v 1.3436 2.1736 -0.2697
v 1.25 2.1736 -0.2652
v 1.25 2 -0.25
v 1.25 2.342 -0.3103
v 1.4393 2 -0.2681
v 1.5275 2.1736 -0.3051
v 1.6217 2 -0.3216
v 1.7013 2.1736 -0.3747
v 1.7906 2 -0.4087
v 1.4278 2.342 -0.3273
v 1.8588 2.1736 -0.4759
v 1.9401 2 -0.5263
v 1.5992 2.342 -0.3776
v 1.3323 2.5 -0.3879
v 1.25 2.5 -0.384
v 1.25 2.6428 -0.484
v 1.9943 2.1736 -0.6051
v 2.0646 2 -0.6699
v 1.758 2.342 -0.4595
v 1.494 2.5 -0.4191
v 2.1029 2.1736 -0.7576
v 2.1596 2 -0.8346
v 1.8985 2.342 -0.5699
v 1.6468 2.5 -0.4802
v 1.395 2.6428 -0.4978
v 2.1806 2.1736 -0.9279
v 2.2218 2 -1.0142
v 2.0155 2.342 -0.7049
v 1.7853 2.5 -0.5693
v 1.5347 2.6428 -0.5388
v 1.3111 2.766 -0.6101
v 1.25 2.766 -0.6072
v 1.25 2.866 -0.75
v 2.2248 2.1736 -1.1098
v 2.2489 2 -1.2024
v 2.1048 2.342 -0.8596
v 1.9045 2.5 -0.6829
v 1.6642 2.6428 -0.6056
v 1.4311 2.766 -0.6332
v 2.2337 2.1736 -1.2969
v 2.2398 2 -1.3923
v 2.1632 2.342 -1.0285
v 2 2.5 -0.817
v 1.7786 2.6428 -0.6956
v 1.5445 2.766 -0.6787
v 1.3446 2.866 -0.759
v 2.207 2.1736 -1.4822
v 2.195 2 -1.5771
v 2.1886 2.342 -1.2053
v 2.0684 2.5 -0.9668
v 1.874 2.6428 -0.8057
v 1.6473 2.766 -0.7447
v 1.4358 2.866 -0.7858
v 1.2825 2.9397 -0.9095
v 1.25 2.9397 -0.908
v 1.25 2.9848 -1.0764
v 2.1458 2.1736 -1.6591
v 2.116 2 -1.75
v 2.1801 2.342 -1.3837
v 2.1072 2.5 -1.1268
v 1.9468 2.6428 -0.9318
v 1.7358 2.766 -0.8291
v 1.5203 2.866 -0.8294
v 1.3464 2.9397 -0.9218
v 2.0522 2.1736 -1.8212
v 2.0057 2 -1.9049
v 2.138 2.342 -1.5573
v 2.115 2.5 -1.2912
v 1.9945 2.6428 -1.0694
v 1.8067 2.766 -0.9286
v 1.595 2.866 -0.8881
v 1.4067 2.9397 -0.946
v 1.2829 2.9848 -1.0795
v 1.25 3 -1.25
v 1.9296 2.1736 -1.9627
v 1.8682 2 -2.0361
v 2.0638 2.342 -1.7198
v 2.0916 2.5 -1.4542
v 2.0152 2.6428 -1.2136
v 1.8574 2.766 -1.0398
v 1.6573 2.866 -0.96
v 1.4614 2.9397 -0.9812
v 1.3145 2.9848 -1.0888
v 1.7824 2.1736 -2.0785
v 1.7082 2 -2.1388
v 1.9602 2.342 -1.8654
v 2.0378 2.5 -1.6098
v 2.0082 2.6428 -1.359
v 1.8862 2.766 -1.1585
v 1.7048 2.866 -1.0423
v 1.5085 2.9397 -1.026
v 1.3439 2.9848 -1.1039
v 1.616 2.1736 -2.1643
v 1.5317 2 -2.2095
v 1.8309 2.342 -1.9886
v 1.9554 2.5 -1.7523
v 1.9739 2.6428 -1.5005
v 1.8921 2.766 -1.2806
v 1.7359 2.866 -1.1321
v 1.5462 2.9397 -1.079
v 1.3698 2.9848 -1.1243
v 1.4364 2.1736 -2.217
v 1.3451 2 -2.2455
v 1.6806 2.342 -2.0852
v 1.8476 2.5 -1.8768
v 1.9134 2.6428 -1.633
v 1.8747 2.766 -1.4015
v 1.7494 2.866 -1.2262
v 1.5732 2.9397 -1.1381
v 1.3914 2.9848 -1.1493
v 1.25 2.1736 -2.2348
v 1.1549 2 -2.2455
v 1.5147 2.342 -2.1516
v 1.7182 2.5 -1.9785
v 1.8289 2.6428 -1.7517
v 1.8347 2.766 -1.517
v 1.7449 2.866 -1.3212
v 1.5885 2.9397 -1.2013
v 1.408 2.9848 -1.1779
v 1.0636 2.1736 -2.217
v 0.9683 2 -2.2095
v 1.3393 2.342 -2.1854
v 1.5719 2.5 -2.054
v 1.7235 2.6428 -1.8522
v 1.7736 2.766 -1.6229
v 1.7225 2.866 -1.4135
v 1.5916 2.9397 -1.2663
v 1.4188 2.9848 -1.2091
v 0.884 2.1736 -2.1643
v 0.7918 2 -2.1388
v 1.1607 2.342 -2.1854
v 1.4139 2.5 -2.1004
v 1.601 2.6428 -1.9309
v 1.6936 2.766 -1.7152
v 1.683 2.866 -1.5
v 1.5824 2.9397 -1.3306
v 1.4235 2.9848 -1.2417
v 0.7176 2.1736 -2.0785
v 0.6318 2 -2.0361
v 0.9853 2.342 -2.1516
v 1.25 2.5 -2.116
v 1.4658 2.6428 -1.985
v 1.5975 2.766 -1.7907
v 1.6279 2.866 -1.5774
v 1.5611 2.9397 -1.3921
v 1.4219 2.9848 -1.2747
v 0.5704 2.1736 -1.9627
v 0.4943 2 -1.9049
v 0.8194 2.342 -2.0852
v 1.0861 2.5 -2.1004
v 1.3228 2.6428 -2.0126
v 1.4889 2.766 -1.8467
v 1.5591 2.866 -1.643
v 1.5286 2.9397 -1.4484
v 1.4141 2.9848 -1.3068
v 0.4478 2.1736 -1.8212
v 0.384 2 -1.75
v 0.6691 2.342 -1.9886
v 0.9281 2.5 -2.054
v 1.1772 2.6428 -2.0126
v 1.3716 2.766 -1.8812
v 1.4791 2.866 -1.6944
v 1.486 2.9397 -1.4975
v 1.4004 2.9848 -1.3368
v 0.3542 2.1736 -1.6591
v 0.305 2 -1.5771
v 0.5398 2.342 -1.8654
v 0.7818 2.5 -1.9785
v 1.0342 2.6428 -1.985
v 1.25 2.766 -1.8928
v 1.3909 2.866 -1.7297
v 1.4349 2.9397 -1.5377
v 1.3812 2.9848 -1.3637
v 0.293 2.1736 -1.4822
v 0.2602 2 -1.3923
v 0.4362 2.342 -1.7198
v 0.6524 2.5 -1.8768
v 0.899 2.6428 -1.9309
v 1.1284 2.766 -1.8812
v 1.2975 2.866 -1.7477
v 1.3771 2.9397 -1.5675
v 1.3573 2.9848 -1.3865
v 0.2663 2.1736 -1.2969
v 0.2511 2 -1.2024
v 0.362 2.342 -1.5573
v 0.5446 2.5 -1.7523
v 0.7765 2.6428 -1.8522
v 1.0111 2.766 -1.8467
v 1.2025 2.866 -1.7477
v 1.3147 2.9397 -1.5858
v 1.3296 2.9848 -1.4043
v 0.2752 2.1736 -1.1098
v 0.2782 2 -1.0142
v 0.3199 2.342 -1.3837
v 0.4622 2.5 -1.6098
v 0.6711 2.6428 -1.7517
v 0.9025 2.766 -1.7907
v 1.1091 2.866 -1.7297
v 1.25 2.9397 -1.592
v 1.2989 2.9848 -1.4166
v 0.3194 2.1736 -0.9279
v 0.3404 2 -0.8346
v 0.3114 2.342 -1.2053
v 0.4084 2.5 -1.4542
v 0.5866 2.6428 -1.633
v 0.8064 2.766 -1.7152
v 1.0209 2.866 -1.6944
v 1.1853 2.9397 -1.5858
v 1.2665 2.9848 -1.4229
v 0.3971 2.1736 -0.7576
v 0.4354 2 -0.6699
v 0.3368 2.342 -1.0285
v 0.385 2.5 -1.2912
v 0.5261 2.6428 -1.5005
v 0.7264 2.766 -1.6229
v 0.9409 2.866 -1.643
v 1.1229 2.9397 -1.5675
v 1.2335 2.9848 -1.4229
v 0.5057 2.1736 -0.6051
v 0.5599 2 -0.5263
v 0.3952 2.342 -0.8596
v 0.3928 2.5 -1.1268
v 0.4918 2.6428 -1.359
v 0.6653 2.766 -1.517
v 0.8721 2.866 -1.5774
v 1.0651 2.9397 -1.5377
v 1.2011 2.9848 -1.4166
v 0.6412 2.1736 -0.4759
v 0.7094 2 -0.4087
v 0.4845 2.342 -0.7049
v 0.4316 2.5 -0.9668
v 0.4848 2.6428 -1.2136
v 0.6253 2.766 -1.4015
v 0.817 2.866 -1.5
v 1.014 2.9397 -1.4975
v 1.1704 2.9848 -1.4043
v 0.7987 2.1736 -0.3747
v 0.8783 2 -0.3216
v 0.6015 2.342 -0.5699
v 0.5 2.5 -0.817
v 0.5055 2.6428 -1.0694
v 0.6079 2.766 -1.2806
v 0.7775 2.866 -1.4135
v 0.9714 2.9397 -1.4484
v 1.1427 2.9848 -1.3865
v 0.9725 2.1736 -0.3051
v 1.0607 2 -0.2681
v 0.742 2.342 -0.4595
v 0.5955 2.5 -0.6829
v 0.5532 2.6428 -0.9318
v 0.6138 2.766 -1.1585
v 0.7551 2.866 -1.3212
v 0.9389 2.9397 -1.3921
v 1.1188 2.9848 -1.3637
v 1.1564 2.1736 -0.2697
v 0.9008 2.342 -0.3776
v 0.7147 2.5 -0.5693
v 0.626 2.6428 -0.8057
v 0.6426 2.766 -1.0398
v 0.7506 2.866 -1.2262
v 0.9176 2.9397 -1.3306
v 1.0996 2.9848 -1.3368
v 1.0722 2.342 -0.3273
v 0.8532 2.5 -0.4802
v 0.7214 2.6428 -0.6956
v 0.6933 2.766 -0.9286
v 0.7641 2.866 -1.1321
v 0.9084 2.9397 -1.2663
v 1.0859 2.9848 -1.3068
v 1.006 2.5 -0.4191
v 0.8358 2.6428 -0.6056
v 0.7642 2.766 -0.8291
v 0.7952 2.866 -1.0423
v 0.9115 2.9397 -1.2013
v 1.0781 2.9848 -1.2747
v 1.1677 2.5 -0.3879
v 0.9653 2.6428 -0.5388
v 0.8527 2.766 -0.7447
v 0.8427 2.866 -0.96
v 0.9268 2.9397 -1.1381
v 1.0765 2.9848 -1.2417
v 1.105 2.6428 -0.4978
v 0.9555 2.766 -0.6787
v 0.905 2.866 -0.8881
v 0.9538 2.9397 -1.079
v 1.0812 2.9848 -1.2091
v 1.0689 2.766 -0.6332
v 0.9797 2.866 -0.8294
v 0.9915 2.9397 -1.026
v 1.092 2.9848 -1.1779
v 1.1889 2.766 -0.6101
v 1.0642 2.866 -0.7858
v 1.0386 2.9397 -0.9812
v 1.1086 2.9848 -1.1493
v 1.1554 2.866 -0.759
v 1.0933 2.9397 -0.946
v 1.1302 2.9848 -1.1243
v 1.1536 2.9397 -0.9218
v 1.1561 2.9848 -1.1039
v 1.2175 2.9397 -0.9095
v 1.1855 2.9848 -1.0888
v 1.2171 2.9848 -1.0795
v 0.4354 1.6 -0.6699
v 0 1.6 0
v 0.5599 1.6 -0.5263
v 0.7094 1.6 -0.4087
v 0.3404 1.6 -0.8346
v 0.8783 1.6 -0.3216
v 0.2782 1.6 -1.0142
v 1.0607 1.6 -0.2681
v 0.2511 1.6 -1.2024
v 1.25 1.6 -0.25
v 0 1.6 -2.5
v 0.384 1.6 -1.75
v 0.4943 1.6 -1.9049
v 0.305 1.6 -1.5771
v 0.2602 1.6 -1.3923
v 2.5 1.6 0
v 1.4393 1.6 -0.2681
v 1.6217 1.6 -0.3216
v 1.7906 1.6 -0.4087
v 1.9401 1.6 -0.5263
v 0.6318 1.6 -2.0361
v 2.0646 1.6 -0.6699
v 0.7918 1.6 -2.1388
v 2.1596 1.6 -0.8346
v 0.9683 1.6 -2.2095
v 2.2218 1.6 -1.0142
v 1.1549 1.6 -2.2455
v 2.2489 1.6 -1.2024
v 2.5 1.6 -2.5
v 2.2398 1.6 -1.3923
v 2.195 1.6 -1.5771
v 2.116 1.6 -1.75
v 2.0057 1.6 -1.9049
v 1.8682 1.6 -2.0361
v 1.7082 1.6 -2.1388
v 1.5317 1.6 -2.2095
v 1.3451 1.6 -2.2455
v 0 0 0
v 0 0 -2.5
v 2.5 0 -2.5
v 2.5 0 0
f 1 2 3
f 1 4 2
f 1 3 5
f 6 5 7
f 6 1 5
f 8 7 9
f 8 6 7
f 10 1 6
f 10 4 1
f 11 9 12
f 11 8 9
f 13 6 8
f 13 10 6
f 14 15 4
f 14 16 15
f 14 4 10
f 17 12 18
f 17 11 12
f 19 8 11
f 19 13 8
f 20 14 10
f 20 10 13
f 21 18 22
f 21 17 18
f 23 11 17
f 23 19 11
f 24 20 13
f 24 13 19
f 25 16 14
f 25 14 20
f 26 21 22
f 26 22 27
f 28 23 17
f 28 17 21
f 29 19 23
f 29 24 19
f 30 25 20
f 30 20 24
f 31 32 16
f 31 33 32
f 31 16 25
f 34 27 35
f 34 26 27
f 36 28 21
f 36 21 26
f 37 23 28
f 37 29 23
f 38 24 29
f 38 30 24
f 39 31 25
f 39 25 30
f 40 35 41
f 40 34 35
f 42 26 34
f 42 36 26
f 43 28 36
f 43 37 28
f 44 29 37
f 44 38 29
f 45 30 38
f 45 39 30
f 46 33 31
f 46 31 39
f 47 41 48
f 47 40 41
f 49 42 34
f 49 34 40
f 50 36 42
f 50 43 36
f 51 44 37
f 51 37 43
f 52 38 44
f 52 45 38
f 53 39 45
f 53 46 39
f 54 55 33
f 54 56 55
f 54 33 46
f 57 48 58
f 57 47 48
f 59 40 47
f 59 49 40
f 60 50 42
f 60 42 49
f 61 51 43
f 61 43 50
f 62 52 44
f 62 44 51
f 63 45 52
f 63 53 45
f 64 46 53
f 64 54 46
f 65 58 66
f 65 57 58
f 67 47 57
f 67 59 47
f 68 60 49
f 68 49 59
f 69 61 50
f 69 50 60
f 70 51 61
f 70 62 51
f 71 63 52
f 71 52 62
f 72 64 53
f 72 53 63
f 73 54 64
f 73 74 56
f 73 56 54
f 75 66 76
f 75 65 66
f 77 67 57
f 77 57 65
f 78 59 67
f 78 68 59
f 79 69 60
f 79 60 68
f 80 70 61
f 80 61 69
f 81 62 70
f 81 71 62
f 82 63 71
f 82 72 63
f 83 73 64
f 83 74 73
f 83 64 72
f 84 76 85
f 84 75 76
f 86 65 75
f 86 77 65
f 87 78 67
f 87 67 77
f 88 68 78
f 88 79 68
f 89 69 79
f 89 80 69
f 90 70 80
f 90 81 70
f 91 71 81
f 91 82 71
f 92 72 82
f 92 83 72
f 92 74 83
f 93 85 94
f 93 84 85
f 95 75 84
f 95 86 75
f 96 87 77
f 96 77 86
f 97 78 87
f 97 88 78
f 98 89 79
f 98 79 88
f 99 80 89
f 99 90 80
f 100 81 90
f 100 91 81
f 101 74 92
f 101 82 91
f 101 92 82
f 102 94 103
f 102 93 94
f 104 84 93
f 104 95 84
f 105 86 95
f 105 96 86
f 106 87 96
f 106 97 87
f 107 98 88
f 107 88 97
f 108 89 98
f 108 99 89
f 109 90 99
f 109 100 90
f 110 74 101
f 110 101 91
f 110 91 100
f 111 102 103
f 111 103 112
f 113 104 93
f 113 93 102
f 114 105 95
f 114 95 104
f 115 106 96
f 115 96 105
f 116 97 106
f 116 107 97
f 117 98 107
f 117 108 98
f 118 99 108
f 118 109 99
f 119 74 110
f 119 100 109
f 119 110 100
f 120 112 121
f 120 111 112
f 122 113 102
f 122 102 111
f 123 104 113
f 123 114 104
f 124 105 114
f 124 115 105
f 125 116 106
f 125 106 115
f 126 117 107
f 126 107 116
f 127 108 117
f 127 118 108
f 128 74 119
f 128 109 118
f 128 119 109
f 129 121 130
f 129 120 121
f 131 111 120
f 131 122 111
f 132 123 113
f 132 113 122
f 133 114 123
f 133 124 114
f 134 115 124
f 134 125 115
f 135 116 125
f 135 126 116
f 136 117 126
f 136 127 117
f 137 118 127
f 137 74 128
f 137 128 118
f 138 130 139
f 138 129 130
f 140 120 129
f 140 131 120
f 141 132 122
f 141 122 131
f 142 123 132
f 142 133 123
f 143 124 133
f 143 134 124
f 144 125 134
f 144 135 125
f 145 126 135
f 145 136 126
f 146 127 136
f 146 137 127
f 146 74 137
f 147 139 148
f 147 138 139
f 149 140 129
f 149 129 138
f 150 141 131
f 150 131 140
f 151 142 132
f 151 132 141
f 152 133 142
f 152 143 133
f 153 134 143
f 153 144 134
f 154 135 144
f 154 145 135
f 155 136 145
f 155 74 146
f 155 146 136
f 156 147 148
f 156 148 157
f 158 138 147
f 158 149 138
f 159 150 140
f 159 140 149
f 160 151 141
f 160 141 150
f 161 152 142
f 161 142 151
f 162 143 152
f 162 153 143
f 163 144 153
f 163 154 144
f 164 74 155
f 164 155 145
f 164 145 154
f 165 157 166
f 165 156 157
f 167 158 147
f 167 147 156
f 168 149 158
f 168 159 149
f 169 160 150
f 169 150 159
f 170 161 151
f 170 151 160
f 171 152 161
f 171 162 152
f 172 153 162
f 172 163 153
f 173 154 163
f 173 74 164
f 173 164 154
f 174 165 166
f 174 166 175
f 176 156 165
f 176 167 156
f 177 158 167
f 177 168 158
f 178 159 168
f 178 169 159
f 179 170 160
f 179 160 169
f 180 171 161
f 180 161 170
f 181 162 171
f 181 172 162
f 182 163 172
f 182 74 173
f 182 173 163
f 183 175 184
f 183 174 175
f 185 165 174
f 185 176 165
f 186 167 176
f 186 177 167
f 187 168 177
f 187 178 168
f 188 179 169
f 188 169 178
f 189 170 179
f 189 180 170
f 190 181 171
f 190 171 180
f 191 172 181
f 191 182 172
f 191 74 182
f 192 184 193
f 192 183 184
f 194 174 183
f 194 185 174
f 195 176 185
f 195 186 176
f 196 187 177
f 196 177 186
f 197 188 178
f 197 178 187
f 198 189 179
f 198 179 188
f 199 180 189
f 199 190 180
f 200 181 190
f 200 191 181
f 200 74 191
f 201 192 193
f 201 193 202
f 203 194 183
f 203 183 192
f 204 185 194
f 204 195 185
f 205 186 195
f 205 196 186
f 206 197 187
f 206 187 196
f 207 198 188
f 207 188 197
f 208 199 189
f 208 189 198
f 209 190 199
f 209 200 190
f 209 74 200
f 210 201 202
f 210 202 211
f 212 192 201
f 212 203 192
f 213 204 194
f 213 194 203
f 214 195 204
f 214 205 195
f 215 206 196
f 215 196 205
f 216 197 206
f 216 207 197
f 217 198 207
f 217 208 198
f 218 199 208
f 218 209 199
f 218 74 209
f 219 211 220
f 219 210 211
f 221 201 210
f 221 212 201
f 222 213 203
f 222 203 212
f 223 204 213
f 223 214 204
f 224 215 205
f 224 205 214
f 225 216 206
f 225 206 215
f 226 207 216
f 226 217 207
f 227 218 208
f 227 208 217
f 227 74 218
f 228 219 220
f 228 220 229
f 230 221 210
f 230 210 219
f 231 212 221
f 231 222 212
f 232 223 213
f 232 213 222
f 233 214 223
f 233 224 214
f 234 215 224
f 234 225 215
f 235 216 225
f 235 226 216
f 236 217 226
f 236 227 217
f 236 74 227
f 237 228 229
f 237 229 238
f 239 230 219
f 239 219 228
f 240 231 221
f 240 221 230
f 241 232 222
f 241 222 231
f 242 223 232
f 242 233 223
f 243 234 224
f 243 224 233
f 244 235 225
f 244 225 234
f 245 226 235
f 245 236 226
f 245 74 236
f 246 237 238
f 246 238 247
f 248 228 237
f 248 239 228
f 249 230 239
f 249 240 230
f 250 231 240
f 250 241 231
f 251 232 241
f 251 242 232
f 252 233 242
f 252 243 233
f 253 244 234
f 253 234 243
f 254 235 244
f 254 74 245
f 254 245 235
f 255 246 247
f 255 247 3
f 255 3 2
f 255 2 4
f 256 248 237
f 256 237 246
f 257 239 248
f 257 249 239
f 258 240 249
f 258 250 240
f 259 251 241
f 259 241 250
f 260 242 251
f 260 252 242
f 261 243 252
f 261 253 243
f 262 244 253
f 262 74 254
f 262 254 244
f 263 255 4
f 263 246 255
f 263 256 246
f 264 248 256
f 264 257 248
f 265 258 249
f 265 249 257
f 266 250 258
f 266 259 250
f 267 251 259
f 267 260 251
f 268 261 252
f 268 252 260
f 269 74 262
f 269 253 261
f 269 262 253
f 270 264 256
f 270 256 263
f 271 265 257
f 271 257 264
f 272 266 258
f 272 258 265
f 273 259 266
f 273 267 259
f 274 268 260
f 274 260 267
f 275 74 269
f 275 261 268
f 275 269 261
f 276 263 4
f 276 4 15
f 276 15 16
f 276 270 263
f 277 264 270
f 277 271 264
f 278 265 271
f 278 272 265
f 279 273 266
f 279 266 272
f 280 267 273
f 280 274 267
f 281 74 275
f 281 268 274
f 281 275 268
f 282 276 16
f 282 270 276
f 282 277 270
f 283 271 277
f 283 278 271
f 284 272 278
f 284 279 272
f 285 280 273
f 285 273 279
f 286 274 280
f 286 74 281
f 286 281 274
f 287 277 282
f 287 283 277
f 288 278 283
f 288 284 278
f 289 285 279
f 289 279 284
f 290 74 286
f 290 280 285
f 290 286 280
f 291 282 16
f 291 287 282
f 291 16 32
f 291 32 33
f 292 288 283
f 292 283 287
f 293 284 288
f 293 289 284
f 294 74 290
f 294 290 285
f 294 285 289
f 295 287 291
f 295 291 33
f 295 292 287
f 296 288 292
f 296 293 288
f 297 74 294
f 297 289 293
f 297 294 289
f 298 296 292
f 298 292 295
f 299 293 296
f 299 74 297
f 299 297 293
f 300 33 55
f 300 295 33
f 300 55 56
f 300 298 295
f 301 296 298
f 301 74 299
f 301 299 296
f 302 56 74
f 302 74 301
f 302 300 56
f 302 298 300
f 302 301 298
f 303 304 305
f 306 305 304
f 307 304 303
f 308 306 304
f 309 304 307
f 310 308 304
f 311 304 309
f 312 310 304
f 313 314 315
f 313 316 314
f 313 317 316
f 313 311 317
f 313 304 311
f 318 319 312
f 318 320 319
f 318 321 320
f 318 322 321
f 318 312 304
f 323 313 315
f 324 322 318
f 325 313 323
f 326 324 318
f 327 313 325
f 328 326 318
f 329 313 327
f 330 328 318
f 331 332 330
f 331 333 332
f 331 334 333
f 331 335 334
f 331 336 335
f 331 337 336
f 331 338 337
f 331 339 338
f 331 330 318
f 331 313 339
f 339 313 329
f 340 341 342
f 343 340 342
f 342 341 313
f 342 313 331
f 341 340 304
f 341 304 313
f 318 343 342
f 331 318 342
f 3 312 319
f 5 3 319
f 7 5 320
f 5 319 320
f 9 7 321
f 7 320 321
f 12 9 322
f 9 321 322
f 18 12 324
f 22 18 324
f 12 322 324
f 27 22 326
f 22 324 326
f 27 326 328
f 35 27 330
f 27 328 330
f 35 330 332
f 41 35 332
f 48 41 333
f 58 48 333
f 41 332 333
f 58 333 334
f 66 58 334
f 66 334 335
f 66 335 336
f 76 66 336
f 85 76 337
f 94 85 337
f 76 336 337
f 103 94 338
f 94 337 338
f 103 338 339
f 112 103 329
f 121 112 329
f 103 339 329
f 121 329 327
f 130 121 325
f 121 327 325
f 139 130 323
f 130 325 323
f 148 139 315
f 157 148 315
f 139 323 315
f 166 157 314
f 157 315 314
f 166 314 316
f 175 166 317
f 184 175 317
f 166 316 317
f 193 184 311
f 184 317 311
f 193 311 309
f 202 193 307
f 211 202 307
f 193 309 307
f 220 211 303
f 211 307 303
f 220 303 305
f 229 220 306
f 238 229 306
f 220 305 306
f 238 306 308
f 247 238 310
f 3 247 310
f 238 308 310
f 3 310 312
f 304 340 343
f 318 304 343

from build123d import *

# Parameters (mm, degrees)
SKETCH1_W           = 2.5
SKETCH1_H           = 2.5
BOSS_EXTRUDE1_DEPTH = 1.6
SKETCH2_R           = 1
BOSS_EXTRUDE2_DEPTH = 1.4
FILLET1_R           = 1


with BuildPart() as part:
    # Sketch1 → Boss-Extrude1 (new body)
    with BuildSketch(Plane(origin=(0, 0, 0), x_dir=(1, 0, 0), z_dir=(0, 1, 0))):
        with Locations((1.25, 1.25)):
            Rectangle(SKETCH1_W, SKETCH1_H)
    extrude(amount=BOSS_EXTRUDE1_DEPTH)

    # Sketch2 → Boss-Extrude2 (add)
    with BuildSketch(Plane(origin=(0, 1.6, 0), x_dir=(1, 0, 0), z_dir=(0, 1, 0))):
        with Locations(Location((1.25, 1.25, 0), (0, 0, 270))):
            Circle(SKETCH2_R)
    extrude(amount=BOSS_EXTRUDE2_DEPTH)

    # Fillet1
    fillet1_edges = [part.edges().sort_by_distance(p)[0] for p in [
        (1.25, 3, -2.25),
    ]]
    fillet(fillet1_edges, radius=FILLET1_R)


solid = part.part
